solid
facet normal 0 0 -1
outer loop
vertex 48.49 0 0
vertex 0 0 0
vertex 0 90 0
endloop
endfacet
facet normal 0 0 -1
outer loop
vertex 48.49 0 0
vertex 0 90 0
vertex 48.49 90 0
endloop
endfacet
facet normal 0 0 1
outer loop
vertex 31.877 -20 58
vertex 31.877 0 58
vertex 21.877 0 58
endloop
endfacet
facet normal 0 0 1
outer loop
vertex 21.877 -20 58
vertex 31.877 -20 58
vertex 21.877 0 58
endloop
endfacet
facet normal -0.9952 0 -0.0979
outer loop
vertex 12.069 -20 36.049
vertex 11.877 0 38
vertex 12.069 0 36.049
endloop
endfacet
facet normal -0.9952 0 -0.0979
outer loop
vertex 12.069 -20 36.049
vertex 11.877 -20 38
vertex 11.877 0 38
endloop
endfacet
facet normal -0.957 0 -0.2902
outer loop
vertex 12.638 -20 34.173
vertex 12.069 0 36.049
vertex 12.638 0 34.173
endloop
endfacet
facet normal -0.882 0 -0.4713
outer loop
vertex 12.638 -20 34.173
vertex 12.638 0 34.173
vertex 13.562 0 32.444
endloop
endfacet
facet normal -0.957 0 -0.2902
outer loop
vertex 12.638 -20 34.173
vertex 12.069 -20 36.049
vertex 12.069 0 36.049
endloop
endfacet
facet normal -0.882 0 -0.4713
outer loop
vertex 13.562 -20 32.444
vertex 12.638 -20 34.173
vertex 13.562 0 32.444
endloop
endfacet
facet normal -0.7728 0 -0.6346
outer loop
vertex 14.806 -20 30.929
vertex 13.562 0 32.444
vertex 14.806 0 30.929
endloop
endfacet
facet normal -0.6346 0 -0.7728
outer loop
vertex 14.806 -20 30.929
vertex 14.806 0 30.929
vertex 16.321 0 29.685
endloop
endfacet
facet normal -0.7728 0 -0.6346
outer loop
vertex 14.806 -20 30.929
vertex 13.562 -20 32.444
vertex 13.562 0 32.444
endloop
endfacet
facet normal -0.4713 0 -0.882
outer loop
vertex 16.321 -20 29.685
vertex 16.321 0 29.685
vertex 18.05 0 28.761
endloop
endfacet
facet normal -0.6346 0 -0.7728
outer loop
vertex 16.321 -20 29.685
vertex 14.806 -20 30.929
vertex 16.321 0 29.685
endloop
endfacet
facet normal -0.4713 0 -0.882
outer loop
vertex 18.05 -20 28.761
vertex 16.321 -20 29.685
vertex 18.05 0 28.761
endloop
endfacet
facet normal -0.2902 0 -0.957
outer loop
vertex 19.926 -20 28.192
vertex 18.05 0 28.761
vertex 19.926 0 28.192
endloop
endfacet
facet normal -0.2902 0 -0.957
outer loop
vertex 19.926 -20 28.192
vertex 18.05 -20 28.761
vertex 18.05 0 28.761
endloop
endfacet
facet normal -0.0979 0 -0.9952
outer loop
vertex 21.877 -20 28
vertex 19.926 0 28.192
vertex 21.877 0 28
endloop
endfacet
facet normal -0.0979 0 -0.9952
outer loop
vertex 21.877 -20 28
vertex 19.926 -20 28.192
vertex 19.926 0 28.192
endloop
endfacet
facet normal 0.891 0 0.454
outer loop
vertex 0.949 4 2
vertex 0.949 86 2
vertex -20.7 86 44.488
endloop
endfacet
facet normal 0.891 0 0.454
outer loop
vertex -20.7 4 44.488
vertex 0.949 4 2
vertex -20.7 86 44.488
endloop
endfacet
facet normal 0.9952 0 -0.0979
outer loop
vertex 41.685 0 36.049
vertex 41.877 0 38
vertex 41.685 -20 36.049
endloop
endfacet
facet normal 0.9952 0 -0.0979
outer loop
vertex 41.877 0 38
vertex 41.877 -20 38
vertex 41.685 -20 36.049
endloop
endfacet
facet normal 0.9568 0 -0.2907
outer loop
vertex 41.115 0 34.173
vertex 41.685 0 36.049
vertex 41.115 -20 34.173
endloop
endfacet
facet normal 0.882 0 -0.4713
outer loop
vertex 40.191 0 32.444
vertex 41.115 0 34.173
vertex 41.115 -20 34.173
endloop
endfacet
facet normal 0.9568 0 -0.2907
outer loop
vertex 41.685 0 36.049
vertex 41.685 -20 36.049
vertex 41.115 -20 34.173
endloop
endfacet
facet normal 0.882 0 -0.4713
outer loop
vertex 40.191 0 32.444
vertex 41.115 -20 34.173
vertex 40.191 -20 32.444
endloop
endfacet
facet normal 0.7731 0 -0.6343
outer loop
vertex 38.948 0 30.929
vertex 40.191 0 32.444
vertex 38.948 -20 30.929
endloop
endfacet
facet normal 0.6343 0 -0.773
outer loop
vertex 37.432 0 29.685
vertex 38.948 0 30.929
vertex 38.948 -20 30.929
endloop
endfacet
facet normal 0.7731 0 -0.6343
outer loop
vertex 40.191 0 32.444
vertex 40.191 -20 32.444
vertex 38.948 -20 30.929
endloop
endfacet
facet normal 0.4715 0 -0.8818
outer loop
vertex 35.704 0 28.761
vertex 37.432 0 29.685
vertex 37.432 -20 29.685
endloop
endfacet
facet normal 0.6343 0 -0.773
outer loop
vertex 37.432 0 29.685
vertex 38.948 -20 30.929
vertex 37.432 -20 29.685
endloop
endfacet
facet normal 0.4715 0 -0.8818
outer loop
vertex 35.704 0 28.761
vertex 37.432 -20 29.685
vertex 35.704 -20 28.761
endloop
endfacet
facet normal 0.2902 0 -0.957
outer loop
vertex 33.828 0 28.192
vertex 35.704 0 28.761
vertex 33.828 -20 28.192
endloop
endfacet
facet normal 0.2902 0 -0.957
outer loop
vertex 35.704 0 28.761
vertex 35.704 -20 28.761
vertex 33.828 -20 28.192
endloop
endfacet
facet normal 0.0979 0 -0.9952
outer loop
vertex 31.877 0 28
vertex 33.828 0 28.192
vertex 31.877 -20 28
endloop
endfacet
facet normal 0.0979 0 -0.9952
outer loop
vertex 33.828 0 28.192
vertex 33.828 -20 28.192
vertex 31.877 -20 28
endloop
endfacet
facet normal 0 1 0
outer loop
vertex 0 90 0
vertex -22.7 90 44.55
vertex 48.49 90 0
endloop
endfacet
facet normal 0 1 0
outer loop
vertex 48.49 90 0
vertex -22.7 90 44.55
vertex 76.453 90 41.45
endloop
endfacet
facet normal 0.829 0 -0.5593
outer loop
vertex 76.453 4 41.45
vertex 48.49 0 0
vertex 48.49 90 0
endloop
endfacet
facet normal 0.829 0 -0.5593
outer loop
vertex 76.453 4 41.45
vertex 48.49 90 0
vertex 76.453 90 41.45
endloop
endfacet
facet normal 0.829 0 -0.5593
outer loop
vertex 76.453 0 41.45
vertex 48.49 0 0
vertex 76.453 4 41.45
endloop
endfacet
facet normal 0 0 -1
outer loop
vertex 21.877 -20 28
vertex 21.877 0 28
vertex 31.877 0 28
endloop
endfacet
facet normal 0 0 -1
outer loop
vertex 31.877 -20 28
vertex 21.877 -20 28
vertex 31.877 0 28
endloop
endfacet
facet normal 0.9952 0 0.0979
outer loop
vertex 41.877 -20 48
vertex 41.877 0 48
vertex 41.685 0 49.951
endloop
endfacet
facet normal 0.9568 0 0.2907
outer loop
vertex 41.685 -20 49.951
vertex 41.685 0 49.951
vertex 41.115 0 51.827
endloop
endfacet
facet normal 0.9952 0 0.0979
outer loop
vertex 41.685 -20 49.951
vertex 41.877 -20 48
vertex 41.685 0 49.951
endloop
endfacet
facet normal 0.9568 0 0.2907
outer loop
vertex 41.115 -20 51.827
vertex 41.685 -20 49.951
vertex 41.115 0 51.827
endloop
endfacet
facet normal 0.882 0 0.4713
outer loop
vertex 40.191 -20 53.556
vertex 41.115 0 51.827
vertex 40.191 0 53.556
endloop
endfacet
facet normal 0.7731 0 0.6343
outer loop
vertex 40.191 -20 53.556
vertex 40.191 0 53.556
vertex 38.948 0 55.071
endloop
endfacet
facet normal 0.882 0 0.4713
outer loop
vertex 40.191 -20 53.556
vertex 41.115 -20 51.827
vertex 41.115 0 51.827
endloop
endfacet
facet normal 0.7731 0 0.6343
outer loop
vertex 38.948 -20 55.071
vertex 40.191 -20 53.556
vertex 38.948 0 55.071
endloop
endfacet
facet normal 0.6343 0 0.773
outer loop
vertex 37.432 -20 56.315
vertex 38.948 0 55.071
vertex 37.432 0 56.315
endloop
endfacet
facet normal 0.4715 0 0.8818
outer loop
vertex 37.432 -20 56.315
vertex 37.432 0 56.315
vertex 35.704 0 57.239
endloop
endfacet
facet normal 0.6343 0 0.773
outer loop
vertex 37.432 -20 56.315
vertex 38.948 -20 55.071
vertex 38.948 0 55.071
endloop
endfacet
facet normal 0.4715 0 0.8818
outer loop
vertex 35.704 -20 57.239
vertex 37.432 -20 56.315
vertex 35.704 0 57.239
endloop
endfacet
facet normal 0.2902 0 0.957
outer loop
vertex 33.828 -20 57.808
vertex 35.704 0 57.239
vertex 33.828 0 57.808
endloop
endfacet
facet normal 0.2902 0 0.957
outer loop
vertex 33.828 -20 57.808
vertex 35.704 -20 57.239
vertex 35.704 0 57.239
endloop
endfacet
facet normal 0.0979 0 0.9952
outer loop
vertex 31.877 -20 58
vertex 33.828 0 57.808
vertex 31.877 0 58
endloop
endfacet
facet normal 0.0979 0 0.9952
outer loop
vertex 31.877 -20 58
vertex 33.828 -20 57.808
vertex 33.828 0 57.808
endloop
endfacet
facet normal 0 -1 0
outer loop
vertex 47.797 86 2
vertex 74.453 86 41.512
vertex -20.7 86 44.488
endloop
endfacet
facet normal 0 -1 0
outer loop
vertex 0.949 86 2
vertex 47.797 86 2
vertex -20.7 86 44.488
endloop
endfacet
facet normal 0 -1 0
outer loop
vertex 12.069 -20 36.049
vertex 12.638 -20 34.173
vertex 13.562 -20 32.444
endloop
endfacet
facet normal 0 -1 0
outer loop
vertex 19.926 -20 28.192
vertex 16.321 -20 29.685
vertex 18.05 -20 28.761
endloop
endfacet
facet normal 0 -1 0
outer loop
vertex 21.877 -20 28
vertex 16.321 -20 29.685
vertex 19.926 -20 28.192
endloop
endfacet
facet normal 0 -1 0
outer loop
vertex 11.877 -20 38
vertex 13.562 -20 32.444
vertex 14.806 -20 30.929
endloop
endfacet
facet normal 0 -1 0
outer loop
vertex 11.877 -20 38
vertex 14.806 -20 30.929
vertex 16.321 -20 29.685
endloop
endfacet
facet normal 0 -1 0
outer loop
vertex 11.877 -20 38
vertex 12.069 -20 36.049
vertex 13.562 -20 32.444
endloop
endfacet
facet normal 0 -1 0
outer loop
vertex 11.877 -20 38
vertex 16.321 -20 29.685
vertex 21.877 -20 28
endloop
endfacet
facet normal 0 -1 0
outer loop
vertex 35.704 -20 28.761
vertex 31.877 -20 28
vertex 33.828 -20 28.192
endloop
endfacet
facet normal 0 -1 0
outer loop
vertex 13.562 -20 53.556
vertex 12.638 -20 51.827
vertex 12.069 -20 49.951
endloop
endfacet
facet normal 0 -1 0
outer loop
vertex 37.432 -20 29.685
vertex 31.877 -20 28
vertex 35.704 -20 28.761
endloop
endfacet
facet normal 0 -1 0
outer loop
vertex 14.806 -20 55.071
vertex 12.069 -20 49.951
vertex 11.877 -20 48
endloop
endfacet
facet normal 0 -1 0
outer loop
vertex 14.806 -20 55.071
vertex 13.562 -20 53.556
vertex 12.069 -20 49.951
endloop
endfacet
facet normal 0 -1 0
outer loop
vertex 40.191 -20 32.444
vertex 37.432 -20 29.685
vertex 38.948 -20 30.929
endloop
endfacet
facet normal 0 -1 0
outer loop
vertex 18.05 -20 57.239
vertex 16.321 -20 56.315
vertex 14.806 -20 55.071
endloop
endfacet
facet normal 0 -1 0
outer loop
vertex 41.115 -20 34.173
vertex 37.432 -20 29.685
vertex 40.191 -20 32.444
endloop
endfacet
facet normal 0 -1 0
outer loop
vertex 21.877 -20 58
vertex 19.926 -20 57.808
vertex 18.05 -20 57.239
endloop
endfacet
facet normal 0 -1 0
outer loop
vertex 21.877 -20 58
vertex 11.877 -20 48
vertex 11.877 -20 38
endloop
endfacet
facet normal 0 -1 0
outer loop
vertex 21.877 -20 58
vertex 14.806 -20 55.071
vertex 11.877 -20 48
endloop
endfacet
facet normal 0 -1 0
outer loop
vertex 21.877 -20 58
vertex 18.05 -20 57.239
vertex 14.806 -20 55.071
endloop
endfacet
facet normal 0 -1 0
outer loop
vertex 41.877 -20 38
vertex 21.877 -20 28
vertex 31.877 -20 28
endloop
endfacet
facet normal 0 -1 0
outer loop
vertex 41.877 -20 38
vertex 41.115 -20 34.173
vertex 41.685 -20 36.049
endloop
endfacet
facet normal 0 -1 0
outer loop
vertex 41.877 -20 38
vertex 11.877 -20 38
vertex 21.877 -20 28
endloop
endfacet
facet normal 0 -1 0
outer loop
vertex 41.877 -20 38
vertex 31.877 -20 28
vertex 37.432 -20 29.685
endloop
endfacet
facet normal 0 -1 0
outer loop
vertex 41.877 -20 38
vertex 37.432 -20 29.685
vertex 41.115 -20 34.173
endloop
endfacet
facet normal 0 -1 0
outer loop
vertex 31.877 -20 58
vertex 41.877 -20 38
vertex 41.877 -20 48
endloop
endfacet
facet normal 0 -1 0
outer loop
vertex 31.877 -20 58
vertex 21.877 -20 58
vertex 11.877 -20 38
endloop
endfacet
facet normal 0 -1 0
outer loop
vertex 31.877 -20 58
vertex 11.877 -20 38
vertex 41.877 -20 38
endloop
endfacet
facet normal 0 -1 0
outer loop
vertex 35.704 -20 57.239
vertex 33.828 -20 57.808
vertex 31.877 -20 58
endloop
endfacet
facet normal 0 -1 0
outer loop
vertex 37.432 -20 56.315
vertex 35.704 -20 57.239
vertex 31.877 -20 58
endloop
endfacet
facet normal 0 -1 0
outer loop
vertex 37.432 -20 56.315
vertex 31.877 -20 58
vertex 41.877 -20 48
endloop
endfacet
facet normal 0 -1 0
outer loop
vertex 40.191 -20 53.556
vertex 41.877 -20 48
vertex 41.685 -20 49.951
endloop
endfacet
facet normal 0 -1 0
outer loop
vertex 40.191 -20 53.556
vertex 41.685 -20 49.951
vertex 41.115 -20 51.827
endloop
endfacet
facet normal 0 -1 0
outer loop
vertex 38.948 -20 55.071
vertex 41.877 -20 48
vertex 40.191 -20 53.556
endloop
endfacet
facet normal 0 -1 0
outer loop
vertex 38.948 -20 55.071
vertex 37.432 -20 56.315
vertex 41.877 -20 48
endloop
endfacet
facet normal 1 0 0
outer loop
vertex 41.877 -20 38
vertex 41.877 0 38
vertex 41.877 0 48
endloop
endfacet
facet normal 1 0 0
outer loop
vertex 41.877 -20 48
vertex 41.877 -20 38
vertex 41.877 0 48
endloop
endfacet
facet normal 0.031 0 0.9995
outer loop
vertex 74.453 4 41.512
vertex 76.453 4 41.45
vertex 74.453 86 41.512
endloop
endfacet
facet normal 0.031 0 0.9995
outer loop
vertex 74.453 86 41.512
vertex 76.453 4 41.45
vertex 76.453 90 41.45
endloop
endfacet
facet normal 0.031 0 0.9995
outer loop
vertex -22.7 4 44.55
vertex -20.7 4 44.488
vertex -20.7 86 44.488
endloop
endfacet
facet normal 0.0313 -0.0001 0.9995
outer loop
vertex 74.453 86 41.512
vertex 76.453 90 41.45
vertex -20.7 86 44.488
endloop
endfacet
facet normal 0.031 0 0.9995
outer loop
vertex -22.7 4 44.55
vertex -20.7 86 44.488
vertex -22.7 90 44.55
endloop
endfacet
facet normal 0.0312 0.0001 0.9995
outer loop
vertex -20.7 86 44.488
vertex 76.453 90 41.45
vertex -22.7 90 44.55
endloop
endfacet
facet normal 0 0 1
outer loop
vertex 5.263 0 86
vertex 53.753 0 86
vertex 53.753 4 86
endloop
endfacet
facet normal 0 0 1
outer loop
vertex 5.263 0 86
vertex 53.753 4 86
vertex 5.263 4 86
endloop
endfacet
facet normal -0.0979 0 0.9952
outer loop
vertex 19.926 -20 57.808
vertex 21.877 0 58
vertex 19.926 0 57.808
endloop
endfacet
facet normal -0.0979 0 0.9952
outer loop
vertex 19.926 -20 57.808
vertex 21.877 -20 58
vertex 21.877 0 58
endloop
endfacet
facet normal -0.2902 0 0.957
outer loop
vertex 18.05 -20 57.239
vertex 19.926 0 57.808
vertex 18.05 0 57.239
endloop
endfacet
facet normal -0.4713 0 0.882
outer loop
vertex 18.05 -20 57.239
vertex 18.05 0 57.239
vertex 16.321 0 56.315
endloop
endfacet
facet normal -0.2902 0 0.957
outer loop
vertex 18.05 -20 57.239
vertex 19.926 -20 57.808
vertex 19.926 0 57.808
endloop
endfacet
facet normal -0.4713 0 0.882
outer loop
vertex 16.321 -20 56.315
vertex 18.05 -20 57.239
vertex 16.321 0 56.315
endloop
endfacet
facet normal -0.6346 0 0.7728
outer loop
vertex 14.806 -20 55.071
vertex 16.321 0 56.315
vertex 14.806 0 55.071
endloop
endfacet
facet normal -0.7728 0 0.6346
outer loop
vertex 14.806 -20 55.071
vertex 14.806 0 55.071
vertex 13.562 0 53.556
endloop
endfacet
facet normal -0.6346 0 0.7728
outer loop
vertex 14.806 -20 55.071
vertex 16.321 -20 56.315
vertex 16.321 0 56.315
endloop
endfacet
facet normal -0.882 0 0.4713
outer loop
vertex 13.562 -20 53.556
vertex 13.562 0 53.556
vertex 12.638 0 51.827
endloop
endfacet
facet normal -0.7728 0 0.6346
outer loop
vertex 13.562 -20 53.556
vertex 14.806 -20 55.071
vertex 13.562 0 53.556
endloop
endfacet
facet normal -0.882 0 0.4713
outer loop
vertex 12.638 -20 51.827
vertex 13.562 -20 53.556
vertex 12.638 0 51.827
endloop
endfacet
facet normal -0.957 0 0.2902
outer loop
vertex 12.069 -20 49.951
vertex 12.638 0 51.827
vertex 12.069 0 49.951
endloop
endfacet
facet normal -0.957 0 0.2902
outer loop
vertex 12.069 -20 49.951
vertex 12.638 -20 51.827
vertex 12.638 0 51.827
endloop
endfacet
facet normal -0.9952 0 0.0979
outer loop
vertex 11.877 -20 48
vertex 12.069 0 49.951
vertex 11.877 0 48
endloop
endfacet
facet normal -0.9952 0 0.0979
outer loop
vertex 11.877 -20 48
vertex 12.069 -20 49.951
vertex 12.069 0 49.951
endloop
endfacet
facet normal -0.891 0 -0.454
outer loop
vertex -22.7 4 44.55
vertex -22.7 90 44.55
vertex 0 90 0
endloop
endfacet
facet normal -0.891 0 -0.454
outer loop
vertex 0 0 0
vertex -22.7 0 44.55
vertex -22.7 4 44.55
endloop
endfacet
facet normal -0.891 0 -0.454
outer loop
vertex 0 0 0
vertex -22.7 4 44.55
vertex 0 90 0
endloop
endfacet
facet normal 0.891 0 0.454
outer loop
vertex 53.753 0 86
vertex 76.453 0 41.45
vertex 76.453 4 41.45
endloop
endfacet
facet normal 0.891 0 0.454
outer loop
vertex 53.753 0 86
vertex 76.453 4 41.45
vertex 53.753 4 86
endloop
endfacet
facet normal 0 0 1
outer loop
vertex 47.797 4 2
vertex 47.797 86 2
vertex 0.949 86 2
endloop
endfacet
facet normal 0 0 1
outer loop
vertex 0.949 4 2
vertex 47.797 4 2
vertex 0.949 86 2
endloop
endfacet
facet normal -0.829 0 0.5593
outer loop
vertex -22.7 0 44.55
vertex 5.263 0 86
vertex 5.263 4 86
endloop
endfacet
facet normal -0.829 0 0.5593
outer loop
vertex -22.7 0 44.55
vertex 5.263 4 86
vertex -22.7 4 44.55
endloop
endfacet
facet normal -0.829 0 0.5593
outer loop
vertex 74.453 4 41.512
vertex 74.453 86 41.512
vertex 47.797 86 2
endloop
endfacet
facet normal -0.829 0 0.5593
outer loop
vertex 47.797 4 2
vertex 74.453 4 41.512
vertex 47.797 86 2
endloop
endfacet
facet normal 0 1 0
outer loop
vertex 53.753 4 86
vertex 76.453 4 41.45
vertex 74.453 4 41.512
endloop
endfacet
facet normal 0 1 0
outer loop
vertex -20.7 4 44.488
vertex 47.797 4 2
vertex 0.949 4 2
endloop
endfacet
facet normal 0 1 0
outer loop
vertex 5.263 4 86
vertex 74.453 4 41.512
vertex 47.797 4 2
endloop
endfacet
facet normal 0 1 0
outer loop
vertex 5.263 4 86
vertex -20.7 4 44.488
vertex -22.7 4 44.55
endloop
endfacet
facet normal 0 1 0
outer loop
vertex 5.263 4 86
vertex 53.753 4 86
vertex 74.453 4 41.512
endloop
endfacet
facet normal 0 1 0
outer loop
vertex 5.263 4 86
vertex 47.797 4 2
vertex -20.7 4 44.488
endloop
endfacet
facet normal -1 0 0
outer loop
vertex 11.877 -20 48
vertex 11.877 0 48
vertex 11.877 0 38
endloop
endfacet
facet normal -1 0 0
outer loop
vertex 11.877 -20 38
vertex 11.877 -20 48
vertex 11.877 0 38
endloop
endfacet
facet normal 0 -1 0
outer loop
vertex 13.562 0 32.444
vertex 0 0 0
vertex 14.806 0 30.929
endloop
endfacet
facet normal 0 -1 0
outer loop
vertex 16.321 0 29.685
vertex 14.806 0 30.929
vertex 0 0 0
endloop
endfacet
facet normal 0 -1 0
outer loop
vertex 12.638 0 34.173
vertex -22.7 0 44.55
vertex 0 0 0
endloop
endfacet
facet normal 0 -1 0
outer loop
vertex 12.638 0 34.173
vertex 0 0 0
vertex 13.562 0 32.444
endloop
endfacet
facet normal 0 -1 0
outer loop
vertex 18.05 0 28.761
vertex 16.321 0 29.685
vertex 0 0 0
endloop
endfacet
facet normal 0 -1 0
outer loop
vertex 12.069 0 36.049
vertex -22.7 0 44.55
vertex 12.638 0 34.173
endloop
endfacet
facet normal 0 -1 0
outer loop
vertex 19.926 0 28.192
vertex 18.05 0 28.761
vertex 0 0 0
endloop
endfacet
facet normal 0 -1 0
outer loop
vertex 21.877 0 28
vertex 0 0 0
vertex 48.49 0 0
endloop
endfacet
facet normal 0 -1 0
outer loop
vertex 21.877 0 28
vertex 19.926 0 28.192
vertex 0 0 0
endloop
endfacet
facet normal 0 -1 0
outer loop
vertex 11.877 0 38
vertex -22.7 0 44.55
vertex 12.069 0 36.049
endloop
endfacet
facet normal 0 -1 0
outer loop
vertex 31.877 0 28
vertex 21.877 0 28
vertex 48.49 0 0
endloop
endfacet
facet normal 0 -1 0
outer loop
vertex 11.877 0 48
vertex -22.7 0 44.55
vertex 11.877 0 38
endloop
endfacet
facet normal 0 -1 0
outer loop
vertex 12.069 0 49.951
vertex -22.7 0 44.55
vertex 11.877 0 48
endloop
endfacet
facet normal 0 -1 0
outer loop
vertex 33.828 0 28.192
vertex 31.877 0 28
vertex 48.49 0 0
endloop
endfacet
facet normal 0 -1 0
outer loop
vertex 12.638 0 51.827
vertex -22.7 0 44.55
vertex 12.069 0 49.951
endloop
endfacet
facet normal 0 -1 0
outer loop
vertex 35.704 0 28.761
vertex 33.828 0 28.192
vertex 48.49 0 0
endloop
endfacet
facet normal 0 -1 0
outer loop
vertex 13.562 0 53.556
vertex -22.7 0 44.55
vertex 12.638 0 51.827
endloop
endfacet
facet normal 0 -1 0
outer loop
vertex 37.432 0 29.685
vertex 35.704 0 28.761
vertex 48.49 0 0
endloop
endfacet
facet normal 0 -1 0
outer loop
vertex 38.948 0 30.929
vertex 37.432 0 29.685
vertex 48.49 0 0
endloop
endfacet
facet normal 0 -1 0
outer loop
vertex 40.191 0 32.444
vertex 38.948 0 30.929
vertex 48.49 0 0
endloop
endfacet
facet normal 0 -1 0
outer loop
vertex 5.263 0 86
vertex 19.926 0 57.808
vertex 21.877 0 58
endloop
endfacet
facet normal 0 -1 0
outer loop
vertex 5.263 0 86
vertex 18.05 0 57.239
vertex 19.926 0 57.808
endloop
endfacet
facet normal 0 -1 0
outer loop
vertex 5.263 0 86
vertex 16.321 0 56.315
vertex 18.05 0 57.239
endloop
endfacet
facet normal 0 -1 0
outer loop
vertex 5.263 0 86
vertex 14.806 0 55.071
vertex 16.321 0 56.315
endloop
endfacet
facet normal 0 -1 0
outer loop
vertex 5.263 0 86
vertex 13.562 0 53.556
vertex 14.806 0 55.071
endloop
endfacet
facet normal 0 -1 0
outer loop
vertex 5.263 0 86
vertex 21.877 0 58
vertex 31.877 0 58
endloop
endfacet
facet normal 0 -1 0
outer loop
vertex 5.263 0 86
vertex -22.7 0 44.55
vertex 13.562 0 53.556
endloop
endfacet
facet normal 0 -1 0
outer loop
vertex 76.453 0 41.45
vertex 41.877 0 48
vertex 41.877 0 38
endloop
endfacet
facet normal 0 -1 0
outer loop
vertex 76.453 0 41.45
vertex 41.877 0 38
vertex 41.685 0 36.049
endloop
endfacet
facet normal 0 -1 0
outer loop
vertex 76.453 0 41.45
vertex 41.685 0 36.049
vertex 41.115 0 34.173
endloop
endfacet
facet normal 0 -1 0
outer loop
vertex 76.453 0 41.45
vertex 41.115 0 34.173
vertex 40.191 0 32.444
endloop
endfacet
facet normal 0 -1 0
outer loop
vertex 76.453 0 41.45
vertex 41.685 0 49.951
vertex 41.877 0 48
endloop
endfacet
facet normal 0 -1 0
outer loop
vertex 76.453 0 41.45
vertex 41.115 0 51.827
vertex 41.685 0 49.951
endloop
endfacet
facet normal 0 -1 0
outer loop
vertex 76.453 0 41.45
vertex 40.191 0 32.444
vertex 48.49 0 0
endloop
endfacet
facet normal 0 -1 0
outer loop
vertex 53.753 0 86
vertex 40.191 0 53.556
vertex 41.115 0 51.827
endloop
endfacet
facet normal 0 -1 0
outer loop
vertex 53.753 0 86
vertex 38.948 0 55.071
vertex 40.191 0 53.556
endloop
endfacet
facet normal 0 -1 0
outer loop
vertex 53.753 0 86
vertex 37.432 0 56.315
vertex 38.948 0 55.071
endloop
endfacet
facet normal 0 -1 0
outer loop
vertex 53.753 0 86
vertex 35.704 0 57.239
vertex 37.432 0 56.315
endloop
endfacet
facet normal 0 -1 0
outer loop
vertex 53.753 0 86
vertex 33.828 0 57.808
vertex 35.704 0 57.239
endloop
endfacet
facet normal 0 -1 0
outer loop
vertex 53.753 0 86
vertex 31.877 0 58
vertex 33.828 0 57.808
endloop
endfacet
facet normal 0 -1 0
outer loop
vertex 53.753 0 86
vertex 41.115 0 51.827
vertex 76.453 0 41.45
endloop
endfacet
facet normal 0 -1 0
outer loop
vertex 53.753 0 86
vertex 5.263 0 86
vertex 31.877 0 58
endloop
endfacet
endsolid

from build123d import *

# Parameters (mm, degrees)
F1_DEPTH = 90
F3_DEPTH = 86
F5_DEPTH = 86
F7_DEPTH = 4
F9_DEPTH = 20
F10_R    = 10


with BuildPart() as f1:
    # F0 (on Front) → F1 (new body)
    with BuildSketch(Plane.XZ):
        Polygon((-22.699524987, 44.5503262094), (0, 0), (48.49, 0), (76.4529137011, 41.4496737906), (53.7533887141, 86), (5.2633887141, 86), align=None)
    extrude(amount=-F1_DEPTH)

    # F2 (on face) → F3 (cut)
    with BuildSketch(Plane(origin=(0, 90, 0), x_dir=(-1, 0, 0), z_dir=(0, 1, 0))):
        Polygon((-53.7533887141, 86), (-76.4529137011, 41.4496737906), (22.699524987, 44.5503262094), (-5.2633887141, 86), align=None)
    extrude(amount=-F3_DEPTH, mode=Mode.SUBTRACT)

    # F4 (on face) → F5 (cut)
    with BuildSketch(Plane(origin=(0, 90, 0), x_dir=(-1, 0, 0), z_dir=(0, 1, 0))):
        Polygon((-74.4529137011, 41.5122169304), (-47.7970534464, 2), (-0.9490817796, 2), (20.699524987, 44.4877830696), align=None)
    extrude(amount=-F5_DEPTH, mode=Mode.SUBTRACT)

    # F6 (on face) → F7 (join)
    with BuildSketch(Plane(origin=(0, 90, 0), x_dir=(-1, 0, 0), z_dir=(0, 1, 0))):
        Polygon((22.699524987, 44.5503262094), (-76.4529137011, 41.4496737906), (-48.49, 0), (0, 0), align=None)
    extrude(amount=-F7_DEPTH)

    # F8 (on face) → F9 (join)
    with BuildSketch(Plane.XZ):
        with BuildLine():
            Line((41.8766943571, 28), (41.8766943571, 43))
            ThreePointArc((41.8766943571, 43), (37.4832960749, 32.3933982822), (26.8766943571, 28))
            Line((26.8766943571, 28), (41.8766943571, 28))
        make_face()
        with BuildLine():
            ThreePointArc((26.8766943571, 58), (37.4832960749, 53.6066017178), (41.8766943571, 43))
            Line((41.8766943571, 43), (41.8766943571, 58))
            Line((41.8766943571, 58), (26.8766943571, 58))
        make_face()
        with BuildLine():
            ThreePointArc((11.8766943571, 43), (16.2700926393, 53.6066017178), (26.8766943571, 58))
            Line((26.8766943571, 58), (11.8766943571, 58))
            Line((11.8766943571, 58), (11.8766943571, 43))
        make_face()
        with BuildLine():
            ThreePointArc((26.8766943571, 28), (37.4832960749, 32.3933982822), (41.8766943571, 43))
            ThreePointArc((41.8766943571, 43), (37.4832960749, 53.6066017178), (26.8766943571, 58))
            ThreePointArc((26.8766943571, 58), (16.2700926393, 53.6066017178), (11.8766943571, 43))
            ThreePointArc((11.8766943571, 43), (16.2700926393, 32.3933982822), (26.8766943571, 28))
        make_face()
        with BuildLine():
            Line((11.8766943571, 28), (26.8766943571, 28))
            ThreePointArc((26.8766943571, 28), (16.2700926393, 32.3933982822), (11.8766943571, 43))
            Line((11.8766943571, 43), (11.8766943571, 28))
        make_face()
    extrude(amount=F9_DEPTH)

    # F10
    f10_edges = [f1.edges().sort_by_distance(p)[0] for p in [
        (11.876694, -10, 58),
        (41.876694, -10, 58),
        (11.876694, -10, 28),
        (41.876694, -10, 28),
    ]]
    fillet(f10_edges, radius=F10_R)


solid = f1.part
